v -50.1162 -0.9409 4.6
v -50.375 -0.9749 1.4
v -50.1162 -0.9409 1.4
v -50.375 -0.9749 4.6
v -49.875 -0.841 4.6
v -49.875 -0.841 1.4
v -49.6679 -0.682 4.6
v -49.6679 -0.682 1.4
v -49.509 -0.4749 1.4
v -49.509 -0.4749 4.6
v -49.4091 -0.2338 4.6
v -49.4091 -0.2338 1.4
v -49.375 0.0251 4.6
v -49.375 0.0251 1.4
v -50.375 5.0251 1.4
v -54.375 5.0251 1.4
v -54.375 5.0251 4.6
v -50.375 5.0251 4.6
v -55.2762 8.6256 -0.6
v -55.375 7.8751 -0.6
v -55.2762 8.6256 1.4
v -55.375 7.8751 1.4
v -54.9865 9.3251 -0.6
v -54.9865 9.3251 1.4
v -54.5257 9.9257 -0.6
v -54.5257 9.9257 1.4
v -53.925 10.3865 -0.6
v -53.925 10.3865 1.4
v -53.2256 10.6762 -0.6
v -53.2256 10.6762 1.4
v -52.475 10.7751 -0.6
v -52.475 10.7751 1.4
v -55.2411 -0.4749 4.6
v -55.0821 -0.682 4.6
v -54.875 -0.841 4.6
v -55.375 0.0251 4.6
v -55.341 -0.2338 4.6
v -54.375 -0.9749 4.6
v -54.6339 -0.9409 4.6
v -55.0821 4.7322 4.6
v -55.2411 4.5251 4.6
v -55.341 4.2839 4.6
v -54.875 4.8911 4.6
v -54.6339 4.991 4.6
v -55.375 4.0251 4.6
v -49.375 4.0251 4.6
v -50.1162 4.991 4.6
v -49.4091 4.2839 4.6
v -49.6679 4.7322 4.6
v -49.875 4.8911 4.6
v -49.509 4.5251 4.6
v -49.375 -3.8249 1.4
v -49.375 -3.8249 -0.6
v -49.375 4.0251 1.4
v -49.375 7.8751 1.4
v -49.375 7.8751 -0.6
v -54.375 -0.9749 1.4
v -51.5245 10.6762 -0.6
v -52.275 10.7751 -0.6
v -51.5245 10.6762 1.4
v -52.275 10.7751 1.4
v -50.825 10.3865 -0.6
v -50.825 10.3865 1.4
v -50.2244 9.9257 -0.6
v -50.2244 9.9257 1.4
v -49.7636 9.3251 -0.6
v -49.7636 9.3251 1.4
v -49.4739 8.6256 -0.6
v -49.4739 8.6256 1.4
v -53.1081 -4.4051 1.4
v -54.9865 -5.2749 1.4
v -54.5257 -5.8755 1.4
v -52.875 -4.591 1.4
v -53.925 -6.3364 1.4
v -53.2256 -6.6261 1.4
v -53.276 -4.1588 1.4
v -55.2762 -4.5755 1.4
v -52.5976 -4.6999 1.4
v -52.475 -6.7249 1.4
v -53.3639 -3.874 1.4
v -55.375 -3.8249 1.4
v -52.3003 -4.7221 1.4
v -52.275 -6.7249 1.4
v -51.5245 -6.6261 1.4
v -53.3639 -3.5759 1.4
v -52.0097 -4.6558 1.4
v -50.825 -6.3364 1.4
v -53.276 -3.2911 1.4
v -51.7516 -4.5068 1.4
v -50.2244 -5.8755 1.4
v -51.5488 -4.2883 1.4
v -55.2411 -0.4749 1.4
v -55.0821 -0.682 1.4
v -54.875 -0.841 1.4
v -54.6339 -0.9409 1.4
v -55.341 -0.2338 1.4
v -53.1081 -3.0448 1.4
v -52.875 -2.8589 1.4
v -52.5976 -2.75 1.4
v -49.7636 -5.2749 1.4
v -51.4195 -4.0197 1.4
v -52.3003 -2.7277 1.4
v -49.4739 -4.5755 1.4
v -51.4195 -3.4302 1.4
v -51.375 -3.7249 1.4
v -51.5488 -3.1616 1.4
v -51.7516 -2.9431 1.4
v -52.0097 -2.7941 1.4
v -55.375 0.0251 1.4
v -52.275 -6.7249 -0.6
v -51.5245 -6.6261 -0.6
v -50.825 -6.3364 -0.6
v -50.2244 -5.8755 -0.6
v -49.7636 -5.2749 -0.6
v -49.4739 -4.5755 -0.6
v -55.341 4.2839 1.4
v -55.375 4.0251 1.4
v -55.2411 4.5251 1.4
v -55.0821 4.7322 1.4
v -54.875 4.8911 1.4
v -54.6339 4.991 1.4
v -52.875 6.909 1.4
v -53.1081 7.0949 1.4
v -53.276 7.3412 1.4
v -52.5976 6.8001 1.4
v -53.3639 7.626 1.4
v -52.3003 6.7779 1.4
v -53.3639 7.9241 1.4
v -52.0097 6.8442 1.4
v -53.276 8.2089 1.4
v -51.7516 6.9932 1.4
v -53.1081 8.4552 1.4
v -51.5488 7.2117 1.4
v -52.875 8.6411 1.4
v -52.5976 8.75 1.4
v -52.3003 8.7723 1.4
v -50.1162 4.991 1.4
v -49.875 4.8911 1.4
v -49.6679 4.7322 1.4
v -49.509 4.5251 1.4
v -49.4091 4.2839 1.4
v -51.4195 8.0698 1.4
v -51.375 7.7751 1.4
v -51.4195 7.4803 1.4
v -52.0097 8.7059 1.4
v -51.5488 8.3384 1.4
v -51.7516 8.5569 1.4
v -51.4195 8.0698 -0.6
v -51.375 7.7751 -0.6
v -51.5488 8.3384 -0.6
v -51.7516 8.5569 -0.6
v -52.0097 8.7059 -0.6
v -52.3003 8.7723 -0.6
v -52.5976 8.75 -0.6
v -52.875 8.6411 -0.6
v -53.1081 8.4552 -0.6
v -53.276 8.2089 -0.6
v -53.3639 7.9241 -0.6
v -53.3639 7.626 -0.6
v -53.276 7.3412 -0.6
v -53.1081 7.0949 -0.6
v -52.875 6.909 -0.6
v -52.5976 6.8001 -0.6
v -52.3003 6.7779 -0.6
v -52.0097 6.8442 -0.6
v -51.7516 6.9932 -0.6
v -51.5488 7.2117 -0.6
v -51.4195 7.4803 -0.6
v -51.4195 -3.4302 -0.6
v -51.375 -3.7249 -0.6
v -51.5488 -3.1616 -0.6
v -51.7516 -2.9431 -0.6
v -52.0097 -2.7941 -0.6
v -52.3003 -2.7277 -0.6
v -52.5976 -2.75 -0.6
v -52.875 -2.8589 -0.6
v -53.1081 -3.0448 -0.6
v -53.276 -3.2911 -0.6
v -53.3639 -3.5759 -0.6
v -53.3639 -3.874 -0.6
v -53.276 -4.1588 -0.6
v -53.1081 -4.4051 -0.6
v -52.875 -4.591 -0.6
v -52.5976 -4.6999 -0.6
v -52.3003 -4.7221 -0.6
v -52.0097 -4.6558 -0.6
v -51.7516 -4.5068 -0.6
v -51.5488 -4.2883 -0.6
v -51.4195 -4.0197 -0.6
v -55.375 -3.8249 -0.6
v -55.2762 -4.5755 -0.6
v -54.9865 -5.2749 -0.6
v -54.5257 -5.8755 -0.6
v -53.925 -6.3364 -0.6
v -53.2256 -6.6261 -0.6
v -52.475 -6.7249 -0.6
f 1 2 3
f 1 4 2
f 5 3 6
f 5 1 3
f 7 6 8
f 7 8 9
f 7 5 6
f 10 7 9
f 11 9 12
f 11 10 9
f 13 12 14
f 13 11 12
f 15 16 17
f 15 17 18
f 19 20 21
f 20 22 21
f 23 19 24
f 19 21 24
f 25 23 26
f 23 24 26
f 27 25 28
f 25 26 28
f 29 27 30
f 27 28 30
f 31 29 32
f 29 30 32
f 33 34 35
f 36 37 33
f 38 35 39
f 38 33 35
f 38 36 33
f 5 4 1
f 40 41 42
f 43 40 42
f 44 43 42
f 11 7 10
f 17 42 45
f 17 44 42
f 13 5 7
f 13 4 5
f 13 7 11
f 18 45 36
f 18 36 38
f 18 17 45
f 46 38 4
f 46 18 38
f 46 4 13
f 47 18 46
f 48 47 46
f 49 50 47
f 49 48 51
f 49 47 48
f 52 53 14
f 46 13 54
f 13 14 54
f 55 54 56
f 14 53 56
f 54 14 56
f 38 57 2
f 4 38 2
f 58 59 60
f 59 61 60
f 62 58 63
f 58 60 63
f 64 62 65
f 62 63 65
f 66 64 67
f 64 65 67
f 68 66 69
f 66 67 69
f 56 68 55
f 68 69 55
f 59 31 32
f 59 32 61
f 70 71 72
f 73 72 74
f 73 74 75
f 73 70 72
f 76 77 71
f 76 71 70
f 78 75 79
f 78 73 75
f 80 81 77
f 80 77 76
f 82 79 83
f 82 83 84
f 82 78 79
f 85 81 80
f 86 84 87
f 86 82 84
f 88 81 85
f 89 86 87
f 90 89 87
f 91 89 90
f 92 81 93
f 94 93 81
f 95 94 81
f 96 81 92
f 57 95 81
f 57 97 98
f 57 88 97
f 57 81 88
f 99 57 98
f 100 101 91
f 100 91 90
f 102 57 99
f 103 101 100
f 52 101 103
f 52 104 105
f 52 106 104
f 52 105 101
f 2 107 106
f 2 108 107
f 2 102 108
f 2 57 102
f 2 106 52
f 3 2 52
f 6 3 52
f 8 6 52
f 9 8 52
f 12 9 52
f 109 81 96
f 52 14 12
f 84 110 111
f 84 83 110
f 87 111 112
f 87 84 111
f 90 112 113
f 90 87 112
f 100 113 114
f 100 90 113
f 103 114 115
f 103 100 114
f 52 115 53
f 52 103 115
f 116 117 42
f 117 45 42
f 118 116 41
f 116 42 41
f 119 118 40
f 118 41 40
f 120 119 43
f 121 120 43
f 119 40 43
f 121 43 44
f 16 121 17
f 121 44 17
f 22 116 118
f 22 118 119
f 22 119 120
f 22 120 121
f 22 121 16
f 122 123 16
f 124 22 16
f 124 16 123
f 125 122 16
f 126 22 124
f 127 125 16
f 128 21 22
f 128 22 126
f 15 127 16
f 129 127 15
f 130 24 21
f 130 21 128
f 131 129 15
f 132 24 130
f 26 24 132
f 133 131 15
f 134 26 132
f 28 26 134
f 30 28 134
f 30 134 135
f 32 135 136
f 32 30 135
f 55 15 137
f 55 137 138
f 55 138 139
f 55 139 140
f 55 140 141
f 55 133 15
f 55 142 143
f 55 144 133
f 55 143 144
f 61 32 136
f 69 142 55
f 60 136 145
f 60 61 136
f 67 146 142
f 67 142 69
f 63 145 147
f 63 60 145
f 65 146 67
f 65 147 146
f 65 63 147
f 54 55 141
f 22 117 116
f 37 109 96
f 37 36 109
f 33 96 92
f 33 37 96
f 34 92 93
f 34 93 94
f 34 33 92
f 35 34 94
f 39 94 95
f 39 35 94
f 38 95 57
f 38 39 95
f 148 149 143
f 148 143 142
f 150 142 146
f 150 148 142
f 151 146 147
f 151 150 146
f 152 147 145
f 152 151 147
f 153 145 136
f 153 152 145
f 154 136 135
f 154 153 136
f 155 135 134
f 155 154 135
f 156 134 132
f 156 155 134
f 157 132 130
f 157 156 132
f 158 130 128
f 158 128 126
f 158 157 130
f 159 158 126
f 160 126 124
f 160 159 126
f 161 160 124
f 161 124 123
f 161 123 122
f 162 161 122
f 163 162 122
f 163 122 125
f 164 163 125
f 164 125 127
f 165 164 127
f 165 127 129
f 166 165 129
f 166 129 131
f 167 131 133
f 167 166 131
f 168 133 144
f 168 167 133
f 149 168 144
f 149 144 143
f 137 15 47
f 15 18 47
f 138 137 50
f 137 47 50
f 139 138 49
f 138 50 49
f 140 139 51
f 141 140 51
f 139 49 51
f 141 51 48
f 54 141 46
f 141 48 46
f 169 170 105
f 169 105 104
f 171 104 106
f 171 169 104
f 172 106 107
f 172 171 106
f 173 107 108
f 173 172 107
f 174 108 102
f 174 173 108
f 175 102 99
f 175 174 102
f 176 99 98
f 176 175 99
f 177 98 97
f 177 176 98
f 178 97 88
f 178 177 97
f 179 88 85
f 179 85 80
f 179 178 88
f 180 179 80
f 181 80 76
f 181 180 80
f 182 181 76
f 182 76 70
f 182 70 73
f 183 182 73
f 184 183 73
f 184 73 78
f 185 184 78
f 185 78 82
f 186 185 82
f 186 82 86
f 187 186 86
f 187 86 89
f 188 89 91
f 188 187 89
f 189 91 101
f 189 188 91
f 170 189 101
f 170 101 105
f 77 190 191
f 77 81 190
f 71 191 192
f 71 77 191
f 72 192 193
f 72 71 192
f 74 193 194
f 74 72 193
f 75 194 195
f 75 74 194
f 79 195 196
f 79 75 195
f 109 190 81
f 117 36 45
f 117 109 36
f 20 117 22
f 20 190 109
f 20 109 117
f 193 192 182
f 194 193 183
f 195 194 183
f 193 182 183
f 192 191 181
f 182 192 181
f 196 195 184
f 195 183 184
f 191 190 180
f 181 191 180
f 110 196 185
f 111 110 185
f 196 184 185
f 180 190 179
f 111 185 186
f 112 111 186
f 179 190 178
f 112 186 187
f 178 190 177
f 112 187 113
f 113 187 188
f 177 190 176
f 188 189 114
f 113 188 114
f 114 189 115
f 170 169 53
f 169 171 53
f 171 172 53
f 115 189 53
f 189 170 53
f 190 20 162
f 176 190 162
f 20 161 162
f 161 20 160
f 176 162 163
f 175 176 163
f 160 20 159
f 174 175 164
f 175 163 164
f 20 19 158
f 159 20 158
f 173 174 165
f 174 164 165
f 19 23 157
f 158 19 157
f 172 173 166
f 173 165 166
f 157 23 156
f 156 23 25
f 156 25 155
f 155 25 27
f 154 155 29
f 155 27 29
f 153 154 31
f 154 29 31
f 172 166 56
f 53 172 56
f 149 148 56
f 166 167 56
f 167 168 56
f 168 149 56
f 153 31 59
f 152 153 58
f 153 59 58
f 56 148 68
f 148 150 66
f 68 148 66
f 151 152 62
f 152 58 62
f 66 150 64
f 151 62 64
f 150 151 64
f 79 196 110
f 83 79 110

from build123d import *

# Parameters (mm, degrees)
SKETCH043_W  = 6
SKETCH043_H  = 17.5
SKETCH043_R  = 1
PAD017_DEPTH = 2
SKETCH044_W  = 6
SKETCH044_H  = 6
PAD018_DEPTH = 3.2
FILLET_R     = 2.9
FILLET001_R  = 1


with BuildPart() as part:
    # Sketch043 (on DatumPlane) → Pad017 (new body)
    with BuildSketch(Plane.XY.offset(-0.600022)):
        with Locations((-52.375043, 2.025062)):
            Rectangle(SKETCH043_W, SKETCH043_H)
        with Locations((-52.375043, 7.775062)):
            Circle(SKETCH043_R, mode=Mode.SUBTRACT)
        with Locations((-52.375043, -3.724938)):
            Circle(SKETCH043_R, mode=Mode.SUBTRACT)
    extrude(amount=PAD017_DEPTH)

    # Sketch044 (on Face8 of Pad017) → Pad018 (join)
    with BuildSketch(Plane.XY.offset(1.399978)):
        with Locations((-52.375043, 2.025062)):
            Rectangle(SKETCH044_W, SKETCH044_H)
    extrude(amount=PAD018_DEPTH)

    # Fillet
    fillet_edges = [part.edges().sort_by_distance(p)[0] for p in [
        (-49.375043, 10.775062, 0.399978),
        (-55.375043, 10.775062, 0.399978),
        (-49.375043, -6.724938, 0.399978),
        (-55.375043, -6.724938, 0.399978),
    ]]
    fillet(fillet_edges, radius=FILLET_R)

    # Fillet001
    fillet001_edges = [part.edges().sort_by_distance(p)[0] for p in [
        (-49.375043, -0.974938, 2.999978),
        (-55.375043, -0.974938, 2.999978),
        (-49.375043, 5.025062, 2.999978),
        (-55.375043, 5.025062, 2.999978),
    ]]
    fillet(fillet001_edges, radius=FILLET001_R)


solid = part.part
